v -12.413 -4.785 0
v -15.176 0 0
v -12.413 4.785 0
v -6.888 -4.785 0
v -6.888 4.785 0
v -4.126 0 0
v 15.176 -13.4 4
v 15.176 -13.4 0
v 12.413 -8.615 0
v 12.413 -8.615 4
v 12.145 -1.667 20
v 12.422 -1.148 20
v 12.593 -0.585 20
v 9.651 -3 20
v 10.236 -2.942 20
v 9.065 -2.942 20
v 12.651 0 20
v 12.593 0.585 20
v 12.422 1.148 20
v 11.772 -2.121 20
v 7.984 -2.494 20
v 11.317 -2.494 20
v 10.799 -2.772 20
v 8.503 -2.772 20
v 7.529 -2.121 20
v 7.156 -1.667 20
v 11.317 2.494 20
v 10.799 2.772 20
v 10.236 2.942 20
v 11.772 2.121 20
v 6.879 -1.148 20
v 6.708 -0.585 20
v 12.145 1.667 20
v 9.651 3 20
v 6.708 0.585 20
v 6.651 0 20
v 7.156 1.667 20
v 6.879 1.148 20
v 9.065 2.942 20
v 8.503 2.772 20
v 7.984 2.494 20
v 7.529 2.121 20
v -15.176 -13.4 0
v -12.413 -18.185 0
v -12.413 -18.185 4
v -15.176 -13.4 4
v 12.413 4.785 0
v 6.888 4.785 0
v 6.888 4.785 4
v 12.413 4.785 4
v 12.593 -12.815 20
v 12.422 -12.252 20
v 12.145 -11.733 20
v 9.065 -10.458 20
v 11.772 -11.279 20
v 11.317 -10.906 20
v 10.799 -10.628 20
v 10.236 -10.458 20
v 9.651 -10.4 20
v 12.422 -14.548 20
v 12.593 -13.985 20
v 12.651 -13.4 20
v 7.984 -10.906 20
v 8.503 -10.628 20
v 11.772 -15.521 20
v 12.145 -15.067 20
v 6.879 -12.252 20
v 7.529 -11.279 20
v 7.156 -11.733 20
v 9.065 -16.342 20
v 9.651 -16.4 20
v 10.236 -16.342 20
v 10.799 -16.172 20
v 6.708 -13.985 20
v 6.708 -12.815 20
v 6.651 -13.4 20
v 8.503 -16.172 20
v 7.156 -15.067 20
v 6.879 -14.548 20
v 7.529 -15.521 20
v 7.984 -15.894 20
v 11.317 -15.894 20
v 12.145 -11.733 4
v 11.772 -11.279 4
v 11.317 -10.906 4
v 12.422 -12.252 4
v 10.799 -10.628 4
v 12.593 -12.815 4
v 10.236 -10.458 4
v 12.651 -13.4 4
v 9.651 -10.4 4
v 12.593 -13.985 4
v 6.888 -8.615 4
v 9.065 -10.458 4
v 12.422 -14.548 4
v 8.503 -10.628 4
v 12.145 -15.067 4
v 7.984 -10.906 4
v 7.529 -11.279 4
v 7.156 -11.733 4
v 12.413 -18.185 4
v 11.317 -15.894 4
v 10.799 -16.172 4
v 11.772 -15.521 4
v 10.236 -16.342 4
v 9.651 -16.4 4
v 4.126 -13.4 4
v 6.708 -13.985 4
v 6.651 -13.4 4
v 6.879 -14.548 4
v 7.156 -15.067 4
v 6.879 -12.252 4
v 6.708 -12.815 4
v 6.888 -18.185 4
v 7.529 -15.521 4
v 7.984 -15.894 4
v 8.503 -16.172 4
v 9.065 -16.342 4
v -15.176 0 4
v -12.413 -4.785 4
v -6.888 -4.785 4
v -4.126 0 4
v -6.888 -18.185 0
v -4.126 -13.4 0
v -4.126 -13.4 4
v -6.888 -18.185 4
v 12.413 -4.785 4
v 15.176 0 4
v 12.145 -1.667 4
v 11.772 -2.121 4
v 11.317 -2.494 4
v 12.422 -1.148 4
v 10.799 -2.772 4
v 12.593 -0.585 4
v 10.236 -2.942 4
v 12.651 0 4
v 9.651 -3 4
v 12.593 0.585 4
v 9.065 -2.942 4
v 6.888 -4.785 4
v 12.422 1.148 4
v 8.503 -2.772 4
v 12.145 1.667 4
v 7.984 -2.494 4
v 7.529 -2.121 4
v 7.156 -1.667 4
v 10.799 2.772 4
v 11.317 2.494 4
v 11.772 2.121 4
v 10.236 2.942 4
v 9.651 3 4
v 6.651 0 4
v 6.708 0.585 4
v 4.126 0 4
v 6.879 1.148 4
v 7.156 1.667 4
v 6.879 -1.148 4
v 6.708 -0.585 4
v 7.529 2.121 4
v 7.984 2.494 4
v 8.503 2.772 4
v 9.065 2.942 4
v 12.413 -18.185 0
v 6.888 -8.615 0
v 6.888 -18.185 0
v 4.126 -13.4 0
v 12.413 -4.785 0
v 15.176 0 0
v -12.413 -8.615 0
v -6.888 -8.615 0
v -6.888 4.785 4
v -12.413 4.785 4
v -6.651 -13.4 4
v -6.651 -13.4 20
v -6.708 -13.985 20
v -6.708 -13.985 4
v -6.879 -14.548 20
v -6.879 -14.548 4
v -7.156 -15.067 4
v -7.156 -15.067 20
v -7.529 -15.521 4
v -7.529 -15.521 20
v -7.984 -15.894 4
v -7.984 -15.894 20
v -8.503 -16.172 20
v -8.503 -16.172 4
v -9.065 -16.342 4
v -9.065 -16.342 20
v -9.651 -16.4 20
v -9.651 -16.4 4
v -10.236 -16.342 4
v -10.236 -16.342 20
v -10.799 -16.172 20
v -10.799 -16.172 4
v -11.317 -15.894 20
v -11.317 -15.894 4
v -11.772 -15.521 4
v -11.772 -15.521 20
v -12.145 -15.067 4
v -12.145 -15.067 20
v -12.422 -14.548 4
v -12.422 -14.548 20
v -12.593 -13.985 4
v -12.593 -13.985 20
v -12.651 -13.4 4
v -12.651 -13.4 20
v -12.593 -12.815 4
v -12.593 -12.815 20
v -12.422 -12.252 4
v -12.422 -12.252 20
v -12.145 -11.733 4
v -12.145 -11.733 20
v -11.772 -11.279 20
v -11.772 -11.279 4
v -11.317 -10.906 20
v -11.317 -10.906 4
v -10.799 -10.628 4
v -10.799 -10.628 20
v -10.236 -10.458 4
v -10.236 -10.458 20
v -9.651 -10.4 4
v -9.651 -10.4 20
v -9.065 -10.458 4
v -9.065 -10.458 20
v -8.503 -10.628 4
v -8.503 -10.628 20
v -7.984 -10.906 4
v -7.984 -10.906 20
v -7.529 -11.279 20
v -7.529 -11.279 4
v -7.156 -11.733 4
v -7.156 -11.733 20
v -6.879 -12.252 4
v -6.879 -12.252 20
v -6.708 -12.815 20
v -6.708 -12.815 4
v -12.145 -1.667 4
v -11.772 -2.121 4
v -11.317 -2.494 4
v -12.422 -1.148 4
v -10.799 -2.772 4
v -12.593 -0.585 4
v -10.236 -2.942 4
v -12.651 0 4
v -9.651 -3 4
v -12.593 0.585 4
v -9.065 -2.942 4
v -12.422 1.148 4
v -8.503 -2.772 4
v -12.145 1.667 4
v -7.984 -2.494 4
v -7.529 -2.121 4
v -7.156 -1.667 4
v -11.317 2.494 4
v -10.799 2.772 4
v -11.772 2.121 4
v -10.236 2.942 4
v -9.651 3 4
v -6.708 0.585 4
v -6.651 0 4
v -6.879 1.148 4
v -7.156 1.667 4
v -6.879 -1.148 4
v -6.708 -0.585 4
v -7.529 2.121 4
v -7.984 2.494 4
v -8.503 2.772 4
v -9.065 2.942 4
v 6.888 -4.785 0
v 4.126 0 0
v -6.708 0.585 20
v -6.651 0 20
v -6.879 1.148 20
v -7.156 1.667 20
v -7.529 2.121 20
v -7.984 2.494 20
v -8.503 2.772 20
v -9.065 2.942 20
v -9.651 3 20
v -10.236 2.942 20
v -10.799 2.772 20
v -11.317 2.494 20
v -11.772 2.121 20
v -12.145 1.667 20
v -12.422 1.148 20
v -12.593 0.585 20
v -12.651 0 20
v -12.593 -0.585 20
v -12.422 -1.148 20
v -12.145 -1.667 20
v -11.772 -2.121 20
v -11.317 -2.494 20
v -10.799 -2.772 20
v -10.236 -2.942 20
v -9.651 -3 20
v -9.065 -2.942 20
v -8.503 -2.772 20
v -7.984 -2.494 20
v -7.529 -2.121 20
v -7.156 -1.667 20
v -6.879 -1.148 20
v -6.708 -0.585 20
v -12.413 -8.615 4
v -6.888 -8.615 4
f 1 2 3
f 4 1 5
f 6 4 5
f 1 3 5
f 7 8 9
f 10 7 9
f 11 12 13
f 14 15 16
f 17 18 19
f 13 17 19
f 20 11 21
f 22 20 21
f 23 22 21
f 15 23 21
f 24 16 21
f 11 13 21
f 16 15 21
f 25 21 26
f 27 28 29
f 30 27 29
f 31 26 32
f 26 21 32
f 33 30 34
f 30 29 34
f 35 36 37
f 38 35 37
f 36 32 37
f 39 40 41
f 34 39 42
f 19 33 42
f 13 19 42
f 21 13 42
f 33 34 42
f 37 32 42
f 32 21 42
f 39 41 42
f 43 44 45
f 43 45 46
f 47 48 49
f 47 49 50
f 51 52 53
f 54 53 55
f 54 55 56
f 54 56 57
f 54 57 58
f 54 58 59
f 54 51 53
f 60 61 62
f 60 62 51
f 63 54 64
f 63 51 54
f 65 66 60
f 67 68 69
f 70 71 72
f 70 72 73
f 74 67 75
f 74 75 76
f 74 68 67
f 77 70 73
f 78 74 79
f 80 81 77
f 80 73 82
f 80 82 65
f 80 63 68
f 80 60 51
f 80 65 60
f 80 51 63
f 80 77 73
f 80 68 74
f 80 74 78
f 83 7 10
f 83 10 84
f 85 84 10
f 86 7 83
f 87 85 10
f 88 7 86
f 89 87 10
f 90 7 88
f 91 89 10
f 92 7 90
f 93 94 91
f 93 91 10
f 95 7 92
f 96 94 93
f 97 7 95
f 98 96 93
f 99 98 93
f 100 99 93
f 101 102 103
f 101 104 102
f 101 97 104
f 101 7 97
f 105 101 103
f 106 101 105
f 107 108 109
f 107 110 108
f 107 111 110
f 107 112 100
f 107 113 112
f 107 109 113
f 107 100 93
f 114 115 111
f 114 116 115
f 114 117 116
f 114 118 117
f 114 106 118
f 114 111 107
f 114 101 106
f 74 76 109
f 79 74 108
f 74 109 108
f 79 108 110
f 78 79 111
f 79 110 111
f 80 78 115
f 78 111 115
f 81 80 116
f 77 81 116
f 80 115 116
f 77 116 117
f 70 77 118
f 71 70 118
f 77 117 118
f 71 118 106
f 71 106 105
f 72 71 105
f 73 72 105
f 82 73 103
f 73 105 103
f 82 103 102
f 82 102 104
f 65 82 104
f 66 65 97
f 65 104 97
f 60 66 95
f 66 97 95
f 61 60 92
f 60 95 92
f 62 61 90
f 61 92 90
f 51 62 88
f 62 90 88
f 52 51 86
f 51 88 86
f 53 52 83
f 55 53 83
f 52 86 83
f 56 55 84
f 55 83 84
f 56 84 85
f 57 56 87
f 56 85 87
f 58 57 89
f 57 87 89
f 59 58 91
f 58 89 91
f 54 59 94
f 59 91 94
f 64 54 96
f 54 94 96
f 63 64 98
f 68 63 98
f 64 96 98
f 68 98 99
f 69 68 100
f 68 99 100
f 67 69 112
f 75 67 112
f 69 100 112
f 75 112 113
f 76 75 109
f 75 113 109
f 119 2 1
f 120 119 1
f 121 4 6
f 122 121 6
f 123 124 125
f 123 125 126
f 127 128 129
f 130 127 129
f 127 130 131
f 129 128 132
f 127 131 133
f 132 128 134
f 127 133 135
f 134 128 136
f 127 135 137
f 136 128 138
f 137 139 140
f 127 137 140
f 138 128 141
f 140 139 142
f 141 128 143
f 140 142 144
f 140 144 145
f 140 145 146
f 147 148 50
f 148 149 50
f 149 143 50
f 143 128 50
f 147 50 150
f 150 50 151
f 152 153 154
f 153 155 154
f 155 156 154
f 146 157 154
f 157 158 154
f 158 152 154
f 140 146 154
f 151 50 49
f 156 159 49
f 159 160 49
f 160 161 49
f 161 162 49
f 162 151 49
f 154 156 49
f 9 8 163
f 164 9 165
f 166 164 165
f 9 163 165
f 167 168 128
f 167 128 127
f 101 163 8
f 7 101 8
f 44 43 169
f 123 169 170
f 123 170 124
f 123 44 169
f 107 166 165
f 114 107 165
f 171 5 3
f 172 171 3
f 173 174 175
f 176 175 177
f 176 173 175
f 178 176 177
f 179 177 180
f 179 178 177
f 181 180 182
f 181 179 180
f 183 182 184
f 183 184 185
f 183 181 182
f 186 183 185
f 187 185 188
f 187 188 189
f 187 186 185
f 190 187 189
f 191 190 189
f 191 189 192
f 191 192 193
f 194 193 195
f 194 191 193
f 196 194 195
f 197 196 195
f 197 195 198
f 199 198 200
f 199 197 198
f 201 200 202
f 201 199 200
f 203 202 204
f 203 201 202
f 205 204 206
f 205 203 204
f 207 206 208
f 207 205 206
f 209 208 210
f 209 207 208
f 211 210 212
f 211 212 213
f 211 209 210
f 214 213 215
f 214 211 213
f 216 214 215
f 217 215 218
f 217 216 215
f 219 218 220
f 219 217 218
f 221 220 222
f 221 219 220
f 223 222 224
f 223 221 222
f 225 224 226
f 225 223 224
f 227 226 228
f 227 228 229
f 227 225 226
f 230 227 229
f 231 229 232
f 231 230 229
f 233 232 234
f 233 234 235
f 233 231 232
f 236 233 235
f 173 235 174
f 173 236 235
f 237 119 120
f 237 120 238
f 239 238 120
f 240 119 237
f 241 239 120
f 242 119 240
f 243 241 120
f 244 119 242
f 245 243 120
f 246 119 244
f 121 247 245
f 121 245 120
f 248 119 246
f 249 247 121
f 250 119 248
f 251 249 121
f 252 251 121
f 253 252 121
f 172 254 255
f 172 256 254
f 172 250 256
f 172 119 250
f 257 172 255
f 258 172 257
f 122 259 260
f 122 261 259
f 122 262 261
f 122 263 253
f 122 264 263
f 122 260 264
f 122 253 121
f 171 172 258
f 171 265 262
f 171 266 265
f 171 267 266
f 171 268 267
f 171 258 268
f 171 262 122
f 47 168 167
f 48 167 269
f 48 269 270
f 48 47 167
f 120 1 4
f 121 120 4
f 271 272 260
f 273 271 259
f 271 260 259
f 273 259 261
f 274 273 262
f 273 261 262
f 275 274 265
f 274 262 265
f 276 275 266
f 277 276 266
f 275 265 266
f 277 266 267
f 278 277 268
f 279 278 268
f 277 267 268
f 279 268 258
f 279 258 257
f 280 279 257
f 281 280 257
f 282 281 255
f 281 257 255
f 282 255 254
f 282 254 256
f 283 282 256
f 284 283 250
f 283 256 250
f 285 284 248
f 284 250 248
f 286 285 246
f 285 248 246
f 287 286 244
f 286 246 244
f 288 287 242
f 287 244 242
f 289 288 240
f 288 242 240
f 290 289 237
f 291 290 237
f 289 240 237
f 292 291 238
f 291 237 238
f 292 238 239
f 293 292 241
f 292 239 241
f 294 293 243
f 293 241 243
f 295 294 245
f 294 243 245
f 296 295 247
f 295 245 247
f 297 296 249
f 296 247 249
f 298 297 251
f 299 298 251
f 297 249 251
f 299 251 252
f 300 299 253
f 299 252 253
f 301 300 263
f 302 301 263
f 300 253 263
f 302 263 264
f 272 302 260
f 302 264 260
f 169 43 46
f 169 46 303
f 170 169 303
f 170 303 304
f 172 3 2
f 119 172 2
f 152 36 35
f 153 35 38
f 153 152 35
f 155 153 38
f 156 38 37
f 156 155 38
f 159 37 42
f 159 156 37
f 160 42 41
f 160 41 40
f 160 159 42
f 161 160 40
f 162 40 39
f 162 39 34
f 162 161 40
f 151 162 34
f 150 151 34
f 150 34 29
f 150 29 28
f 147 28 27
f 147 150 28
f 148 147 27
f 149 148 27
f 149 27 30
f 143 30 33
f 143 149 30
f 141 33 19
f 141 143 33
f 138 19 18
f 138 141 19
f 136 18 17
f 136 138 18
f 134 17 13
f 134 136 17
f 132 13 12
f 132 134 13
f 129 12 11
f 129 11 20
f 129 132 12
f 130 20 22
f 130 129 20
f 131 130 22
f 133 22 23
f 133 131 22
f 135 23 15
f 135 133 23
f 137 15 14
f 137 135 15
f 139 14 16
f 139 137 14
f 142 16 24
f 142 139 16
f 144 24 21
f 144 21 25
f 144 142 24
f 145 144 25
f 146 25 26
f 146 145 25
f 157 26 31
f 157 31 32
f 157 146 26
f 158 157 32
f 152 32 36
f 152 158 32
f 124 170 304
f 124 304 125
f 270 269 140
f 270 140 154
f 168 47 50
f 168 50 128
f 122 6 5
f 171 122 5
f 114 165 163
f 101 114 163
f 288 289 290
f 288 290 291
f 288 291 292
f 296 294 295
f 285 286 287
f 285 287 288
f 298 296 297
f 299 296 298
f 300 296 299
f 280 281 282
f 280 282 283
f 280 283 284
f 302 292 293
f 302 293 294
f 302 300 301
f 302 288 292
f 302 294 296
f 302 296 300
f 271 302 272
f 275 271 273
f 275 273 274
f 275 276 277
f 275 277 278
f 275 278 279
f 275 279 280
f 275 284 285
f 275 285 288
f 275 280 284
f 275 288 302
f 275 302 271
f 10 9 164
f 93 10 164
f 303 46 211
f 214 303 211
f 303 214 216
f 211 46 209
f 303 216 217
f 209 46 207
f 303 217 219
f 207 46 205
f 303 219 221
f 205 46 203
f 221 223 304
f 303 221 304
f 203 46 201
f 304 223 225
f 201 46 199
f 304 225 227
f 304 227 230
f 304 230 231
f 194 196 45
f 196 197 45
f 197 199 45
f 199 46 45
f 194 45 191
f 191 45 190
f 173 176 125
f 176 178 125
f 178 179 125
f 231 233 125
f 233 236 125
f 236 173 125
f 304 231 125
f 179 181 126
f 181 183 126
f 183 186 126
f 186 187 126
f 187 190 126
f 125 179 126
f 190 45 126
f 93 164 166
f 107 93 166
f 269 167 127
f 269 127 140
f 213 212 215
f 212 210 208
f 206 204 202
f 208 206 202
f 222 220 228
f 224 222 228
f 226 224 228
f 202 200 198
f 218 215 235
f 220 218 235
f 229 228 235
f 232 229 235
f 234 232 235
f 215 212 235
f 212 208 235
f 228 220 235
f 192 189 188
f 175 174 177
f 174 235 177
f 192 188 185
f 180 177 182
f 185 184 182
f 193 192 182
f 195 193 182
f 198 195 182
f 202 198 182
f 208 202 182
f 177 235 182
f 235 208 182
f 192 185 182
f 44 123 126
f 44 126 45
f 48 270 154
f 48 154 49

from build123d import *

# Parameters (mm, degrees)
F1_DEPTH = 4
F2_R     = 3
F3_DEPTH = 16


with BuildPart() as f1:
    # F0 (on Top) → F1 (new body)
    with BuildSketch(Plane.XY):
        Polygon((-6.888178, 4.78479), (-12.413178, 4.78479), (-15.175678, 0), (-12.413178, -4.78479), (-6.888178, -4.78479), (-4.125678, 0), align=None)
    extrude(amount=F1_DEPTH)

    # F2 (on face) → F3 (join)
    with BuildSketch(Plane.XY.offset(4)):
        with Locations((-9.650678, 0)):
            Circle(F2_R)
    extrude(amount=F3_DEPTH)


with BuildPart() as f4_1:
    # F4: instance of F1
    add(f1.part.mirror(Plane.YZ))


with BuildPart() as f6_1:
    # F6: instance of F1
    add(f1.part.mirror(Plane.XZ.offset(6.7)))


with BuildPart() as f6_2:
    # F6: instance of F4_1
    add(f4_1.part.mirror(Plane.XZ.offset(6.7)))


solid = Compound([f1.part, f4_1.part, f6_1.part, f6_2.part])
